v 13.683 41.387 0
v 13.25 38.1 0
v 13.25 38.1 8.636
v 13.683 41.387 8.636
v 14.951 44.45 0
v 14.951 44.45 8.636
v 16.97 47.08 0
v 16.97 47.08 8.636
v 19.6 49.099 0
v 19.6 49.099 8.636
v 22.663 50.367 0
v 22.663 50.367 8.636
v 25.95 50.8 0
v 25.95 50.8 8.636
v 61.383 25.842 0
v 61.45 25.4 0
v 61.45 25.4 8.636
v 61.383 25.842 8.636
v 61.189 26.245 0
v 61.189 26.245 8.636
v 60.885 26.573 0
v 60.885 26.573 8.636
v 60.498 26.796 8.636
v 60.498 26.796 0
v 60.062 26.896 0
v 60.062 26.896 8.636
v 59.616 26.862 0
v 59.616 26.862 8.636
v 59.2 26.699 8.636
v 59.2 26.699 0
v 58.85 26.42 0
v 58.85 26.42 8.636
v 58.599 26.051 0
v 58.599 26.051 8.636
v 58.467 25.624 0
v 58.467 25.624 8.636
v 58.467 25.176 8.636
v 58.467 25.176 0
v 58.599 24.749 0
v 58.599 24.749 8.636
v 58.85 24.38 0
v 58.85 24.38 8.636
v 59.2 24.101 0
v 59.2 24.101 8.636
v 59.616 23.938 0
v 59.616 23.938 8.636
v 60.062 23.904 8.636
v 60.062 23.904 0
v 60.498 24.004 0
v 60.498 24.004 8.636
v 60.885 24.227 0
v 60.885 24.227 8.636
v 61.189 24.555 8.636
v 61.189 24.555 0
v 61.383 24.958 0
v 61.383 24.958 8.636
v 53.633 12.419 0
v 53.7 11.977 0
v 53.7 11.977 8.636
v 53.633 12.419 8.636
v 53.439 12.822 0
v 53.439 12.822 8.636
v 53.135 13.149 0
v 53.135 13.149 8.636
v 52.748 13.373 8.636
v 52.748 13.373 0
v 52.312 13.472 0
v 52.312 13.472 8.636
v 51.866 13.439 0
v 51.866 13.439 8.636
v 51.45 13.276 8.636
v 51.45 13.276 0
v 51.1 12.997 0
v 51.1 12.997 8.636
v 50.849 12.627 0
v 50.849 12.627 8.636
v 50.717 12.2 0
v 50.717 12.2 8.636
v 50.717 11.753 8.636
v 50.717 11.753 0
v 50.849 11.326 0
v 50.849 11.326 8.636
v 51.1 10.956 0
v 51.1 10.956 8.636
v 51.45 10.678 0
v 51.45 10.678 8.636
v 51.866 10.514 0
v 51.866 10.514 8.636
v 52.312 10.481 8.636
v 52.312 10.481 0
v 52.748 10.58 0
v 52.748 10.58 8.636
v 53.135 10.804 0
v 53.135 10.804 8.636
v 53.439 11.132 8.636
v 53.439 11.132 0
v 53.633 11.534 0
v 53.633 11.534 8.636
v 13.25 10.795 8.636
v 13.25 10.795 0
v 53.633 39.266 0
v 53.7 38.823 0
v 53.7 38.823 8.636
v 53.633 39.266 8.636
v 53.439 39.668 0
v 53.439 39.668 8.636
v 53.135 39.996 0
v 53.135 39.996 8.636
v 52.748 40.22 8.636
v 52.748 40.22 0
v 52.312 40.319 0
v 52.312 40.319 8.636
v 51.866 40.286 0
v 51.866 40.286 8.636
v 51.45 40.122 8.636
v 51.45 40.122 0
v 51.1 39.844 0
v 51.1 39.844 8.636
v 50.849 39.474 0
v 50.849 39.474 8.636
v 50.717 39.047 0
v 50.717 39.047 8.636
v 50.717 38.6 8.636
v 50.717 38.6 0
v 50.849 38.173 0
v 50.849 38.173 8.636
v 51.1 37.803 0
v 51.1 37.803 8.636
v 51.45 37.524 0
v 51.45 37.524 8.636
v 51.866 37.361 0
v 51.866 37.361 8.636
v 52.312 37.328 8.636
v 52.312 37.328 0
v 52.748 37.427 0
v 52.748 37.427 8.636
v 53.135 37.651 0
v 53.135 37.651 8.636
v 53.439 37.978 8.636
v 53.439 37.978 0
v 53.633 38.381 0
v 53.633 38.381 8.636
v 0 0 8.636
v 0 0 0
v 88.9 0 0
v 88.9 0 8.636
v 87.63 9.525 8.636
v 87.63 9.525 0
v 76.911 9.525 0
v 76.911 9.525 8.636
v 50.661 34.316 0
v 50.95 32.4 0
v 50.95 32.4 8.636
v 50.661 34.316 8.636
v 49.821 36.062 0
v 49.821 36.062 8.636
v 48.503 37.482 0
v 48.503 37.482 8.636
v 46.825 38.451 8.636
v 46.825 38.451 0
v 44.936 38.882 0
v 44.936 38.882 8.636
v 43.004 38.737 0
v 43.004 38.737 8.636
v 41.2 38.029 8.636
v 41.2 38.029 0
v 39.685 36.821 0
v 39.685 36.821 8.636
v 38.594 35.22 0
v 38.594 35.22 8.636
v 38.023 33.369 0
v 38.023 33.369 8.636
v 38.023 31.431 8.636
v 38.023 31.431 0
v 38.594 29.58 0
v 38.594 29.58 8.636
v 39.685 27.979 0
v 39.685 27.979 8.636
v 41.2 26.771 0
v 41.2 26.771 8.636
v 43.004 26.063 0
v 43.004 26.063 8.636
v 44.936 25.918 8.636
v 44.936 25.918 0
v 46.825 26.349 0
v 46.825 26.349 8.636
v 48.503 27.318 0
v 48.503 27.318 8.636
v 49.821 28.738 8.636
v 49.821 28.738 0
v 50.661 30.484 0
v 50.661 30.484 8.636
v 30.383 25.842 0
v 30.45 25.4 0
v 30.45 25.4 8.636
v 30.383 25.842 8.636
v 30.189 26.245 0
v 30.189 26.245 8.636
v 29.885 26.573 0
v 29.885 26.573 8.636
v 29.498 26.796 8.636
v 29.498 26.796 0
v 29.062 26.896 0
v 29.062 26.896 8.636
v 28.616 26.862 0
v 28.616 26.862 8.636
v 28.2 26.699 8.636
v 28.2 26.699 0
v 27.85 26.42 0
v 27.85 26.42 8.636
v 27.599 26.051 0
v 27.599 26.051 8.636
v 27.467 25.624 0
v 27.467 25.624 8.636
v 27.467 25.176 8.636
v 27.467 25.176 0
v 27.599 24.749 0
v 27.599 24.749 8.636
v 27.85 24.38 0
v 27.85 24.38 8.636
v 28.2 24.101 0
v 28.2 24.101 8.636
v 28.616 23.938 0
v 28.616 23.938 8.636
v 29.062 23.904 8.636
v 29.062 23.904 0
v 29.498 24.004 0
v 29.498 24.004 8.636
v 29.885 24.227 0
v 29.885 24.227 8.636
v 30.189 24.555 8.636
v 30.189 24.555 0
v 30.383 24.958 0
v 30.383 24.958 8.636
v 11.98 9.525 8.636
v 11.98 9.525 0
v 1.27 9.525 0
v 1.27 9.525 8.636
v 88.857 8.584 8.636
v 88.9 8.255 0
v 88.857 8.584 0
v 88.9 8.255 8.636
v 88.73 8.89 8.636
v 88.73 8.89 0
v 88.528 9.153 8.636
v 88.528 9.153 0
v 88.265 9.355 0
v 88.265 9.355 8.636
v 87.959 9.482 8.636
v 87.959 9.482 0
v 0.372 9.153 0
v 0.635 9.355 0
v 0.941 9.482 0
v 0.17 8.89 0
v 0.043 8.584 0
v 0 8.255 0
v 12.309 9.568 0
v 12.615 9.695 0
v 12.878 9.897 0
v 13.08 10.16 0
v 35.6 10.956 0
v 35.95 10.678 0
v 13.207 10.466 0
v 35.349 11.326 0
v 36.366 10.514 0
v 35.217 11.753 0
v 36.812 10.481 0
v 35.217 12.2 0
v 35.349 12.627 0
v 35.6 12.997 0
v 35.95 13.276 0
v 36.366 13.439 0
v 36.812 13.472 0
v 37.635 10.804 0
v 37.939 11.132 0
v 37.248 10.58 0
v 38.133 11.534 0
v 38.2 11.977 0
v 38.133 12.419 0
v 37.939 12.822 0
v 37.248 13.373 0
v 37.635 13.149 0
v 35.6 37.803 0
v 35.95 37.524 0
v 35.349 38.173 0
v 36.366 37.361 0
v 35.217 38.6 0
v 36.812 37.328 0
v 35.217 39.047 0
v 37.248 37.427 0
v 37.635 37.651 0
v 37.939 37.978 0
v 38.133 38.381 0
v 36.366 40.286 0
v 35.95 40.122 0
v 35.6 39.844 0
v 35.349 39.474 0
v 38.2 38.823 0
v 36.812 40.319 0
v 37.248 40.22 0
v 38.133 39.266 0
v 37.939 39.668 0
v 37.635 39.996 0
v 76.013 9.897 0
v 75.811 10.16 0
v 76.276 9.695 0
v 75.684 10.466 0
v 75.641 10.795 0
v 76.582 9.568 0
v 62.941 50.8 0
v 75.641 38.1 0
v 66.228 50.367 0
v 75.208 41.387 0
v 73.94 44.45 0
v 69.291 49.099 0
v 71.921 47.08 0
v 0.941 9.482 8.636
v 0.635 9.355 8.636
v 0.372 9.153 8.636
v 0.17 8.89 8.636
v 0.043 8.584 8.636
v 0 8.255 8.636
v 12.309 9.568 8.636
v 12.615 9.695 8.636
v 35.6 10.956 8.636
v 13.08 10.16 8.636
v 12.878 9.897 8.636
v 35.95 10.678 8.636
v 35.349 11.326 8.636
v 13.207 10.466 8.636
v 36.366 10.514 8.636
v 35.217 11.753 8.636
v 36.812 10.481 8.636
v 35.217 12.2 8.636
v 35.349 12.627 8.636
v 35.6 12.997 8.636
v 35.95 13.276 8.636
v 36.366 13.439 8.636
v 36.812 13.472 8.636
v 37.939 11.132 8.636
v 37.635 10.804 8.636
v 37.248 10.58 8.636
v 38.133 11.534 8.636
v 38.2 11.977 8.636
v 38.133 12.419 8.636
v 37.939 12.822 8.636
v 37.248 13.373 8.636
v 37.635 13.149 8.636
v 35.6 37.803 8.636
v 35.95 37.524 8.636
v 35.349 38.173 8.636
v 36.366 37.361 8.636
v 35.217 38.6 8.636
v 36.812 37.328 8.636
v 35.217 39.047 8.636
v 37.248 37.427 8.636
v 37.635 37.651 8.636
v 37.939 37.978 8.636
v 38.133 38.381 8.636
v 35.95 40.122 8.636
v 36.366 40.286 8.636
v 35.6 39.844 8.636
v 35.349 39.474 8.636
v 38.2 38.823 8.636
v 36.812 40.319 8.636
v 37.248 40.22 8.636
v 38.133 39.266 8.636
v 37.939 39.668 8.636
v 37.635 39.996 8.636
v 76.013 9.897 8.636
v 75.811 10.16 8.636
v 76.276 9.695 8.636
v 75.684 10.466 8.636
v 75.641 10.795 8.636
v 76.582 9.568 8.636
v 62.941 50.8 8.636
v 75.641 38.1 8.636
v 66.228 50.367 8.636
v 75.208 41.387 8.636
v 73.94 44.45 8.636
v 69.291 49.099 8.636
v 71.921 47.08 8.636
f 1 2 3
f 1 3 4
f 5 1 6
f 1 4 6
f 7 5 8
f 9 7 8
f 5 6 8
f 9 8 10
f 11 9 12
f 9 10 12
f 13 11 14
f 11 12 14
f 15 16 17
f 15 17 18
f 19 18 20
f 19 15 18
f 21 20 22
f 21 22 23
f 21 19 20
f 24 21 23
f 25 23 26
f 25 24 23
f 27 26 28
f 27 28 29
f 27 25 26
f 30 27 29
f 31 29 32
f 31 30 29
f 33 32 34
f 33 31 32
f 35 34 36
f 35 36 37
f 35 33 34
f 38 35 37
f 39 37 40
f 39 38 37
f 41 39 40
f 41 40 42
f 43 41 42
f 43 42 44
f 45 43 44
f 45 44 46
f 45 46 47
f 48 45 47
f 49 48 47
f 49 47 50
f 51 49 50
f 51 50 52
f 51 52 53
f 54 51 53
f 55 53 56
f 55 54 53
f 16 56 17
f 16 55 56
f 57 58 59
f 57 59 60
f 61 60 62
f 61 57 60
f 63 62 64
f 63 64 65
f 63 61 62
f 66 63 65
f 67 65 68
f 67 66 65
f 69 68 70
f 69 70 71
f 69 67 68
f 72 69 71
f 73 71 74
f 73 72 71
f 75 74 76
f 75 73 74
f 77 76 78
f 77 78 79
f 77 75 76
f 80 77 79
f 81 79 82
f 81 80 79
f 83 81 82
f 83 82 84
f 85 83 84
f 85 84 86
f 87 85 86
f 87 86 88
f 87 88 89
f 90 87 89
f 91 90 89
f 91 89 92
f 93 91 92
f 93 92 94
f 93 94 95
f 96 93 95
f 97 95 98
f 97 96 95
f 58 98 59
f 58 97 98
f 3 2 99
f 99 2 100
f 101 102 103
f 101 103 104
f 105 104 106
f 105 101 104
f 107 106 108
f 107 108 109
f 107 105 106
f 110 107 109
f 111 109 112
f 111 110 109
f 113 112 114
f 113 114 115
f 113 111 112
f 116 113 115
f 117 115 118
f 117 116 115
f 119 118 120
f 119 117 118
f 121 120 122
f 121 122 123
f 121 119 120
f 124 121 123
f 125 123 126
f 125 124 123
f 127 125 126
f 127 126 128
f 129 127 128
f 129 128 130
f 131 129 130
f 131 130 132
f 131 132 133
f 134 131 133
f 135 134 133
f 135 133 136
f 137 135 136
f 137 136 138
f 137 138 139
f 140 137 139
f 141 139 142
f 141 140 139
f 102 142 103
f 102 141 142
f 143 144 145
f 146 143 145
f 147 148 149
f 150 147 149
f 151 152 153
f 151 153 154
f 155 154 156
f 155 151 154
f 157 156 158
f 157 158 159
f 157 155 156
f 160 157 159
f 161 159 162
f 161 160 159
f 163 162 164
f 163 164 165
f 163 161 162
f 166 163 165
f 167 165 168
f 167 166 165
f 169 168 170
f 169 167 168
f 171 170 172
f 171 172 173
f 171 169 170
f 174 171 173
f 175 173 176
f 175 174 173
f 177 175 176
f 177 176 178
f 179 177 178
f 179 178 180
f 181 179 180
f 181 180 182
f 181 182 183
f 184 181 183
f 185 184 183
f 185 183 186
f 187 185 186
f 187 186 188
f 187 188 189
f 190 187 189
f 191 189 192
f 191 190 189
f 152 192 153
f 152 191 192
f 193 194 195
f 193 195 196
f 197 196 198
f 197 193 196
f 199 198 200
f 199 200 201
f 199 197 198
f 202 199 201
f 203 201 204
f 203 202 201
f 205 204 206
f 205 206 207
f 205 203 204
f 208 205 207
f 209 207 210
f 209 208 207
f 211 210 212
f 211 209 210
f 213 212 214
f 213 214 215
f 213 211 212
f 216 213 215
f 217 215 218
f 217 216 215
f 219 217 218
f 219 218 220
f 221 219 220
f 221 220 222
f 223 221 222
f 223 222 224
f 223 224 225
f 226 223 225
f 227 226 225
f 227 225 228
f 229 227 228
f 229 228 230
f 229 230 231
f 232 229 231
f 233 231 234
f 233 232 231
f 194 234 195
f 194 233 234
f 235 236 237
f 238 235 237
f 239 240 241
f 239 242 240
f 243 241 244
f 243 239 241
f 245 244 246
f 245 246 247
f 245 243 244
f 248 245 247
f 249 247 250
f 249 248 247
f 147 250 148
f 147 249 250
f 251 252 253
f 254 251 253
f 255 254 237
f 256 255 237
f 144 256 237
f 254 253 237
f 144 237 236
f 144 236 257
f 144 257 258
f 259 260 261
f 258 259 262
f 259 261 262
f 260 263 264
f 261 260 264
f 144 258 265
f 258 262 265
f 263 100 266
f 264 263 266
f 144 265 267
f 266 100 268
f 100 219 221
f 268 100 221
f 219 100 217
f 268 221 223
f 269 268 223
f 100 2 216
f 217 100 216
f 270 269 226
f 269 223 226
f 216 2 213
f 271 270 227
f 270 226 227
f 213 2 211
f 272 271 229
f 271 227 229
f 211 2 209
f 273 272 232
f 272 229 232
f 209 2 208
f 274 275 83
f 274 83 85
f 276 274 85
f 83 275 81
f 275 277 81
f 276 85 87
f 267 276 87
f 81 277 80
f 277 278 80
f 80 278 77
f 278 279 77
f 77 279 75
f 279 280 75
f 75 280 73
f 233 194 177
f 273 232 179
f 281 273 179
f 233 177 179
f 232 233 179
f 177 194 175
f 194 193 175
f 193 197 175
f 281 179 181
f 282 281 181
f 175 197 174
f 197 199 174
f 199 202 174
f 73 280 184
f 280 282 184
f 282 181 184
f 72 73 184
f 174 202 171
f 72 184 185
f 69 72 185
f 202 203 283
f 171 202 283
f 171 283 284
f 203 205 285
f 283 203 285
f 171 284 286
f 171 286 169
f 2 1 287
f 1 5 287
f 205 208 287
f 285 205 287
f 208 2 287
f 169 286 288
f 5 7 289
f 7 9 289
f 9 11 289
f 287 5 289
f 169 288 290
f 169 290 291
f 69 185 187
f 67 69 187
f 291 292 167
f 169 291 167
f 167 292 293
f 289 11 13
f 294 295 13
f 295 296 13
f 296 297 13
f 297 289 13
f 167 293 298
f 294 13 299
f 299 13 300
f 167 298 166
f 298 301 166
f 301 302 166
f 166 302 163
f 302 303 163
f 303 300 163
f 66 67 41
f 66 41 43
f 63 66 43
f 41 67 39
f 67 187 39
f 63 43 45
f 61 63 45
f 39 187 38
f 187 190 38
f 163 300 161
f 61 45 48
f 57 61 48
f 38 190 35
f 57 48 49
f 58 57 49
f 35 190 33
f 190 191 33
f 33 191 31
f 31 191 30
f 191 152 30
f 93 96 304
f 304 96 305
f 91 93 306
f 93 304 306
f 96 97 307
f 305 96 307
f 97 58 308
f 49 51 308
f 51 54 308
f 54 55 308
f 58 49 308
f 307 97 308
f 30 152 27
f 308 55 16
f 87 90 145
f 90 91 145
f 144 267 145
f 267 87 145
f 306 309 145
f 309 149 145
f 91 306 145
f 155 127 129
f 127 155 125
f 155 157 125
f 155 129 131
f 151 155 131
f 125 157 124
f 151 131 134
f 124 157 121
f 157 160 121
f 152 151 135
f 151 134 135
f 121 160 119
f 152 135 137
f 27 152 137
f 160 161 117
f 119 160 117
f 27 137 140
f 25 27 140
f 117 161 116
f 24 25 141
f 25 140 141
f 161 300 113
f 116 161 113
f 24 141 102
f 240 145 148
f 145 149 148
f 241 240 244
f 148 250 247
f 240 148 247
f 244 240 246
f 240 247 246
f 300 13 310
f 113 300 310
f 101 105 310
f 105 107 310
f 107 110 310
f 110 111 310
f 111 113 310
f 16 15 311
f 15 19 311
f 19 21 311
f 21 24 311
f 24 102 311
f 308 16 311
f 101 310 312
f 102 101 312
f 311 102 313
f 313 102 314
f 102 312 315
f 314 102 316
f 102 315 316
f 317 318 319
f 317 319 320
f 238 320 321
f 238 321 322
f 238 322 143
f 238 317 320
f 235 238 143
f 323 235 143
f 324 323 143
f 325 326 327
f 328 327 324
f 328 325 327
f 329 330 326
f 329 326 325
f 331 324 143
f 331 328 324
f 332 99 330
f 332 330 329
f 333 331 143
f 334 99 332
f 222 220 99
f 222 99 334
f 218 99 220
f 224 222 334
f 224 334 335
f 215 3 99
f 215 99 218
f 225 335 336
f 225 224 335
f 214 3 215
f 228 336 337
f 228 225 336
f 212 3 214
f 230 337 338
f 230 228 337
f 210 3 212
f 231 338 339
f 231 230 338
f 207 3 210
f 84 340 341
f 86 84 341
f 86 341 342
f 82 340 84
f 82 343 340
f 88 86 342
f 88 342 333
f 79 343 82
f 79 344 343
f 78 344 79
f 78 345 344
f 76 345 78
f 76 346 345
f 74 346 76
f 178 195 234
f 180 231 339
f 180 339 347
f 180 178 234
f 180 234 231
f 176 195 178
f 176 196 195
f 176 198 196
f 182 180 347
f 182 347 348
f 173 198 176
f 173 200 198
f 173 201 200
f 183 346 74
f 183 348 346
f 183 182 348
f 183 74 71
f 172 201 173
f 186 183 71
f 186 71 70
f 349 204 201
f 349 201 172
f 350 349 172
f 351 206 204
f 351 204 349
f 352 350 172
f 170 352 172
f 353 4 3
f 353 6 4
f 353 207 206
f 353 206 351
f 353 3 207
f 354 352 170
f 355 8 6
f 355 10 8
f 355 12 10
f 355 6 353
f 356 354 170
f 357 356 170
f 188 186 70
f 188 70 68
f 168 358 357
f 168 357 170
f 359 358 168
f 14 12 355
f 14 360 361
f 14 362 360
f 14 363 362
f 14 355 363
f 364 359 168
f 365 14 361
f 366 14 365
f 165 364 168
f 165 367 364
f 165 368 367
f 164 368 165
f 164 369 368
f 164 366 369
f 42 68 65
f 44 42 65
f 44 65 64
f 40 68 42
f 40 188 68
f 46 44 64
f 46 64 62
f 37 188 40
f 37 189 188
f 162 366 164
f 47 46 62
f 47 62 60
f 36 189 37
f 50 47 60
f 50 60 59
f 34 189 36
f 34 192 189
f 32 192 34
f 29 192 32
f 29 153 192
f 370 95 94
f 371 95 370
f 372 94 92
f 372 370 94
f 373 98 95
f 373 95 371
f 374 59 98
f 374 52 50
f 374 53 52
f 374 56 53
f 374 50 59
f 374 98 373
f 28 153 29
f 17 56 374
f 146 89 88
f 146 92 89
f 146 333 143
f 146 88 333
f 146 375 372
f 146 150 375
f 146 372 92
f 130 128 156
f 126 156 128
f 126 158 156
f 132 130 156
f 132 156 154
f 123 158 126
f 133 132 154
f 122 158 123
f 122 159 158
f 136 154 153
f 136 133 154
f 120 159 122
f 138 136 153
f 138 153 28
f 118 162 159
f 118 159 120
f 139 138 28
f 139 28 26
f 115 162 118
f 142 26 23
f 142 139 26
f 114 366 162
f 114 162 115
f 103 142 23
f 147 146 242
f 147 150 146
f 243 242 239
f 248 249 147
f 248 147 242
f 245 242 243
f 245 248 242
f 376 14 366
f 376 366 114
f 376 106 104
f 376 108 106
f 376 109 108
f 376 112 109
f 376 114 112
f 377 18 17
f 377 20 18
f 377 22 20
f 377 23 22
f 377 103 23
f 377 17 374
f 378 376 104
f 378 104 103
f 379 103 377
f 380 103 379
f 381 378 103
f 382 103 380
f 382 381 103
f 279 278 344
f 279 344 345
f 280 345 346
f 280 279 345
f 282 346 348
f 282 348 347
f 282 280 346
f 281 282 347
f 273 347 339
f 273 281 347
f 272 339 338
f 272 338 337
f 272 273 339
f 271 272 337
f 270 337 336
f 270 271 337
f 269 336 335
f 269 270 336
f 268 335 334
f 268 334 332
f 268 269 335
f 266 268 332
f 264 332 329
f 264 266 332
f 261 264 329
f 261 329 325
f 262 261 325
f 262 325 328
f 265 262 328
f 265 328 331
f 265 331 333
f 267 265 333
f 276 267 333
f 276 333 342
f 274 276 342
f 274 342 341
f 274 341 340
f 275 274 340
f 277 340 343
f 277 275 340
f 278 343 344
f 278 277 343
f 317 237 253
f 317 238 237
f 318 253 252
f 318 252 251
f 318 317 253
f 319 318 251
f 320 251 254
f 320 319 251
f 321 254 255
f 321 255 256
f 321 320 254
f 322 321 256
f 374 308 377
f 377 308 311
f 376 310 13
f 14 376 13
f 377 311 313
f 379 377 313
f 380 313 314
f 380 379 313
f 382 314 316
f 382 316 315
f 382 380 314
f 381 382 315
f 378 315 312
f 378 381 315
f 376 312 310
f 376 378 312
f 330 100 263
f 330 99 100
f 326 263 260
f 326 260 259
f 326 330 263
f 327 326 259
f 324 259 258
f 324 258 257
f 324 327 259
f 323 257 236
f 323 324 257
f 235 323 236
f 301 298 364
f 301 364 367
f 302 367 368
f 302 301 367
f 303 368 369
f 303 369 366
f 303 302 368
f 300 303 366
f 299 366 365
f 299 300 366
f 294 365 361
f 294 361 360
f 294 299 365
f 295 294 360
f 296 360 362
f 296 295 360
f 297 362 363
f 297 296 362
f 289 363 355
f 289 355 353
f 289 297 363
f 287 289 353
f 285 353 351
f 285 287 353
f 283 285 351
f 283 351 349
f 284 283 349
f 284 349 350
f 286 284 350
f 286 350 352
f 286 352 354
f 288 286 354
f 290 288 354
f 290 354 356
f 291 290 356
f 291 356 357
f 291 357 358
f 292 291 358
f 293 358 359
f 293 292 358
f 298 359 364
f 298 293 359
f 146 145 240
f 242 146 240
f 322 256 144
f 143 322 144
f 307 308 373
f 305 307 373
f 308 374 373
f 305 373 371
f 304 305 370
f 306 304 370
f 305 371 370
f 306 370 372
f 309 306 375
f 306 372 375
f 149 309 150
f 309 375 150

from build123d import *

# Parameters (mm, degrees)
SKETCH1_R           = 6.5
SKETCH1_R_2         = 1.5
BOSS_EXTRUDE1_DEPTH = 8.636
FILLET1_R           = 12.7
FILLET2_R           = 1.27


with BuildPart() as part:
    # Sketch1 → Boss-Extrude1 (new body)
    with BuildSketch(Plane.XY):
        Polygon((0, 0), (88.9, 0), (88.9, 9.525), (75.6412, 9.525), (75.6412, 50.8), (13.25, 50.8), (13.25, 9.525), (0, 9.525), align=None)
        with Locations((44.45, 32.4)):
            Circle(SKETCH1_R, mode=Mode.SUBTRACT)
        with Locations((28.95, 25.4)):
            Circle(SKETCH1_R_2, mode=Mode.SUBTRACT)
        with Locations((59.95, 25.4)):
            Circle(SKETCH1_R_2, mode=Mode.SUBTRACT)
        with Locations((52.2, 11.976606241)):
            Circle(SKETCH1_R_2, mode=Mode.SUBTRACT)
        with Locations((36.7, 11.976606241)):
            Circle(SKETCH1_R_2, mode=Mode.SUBTRACT)
        with Locations((36.7, 38.823393759)):
            Circle(SKETCH1_R_2, mode=Mode.SUBTRACT)
        with Locations((52.2, 38.823393759)):
            Circle(SKETCH1_R_2, mode=Mode.SUBTRACT)
    extrude(amount=BOSS_EXTRUDE1_DEPTH)

    # Fillet1
    fillet1_edges = [part.edges().sort_by_distance(p)[0] for p in [
        (13.25, 50.8, 4.318),
        (75.6412, 50.8, 4.318),
    ]]
    fillet(fillet1_edges, radius=FILLET1_R)

    # Fillet2
    fillet2_edges = [part.edges().sort_by_distance(p)[0] for p in [
        (0, 9.525, 4.318),
        (13.25, 9.525, 4.318),
        (75.6412, 9.525, 4.318),
        (88.9, 9.525, 4.318),
    ]]
    fillet(fillet2_edges, radius=FILLET2_R)


solid = part.part
